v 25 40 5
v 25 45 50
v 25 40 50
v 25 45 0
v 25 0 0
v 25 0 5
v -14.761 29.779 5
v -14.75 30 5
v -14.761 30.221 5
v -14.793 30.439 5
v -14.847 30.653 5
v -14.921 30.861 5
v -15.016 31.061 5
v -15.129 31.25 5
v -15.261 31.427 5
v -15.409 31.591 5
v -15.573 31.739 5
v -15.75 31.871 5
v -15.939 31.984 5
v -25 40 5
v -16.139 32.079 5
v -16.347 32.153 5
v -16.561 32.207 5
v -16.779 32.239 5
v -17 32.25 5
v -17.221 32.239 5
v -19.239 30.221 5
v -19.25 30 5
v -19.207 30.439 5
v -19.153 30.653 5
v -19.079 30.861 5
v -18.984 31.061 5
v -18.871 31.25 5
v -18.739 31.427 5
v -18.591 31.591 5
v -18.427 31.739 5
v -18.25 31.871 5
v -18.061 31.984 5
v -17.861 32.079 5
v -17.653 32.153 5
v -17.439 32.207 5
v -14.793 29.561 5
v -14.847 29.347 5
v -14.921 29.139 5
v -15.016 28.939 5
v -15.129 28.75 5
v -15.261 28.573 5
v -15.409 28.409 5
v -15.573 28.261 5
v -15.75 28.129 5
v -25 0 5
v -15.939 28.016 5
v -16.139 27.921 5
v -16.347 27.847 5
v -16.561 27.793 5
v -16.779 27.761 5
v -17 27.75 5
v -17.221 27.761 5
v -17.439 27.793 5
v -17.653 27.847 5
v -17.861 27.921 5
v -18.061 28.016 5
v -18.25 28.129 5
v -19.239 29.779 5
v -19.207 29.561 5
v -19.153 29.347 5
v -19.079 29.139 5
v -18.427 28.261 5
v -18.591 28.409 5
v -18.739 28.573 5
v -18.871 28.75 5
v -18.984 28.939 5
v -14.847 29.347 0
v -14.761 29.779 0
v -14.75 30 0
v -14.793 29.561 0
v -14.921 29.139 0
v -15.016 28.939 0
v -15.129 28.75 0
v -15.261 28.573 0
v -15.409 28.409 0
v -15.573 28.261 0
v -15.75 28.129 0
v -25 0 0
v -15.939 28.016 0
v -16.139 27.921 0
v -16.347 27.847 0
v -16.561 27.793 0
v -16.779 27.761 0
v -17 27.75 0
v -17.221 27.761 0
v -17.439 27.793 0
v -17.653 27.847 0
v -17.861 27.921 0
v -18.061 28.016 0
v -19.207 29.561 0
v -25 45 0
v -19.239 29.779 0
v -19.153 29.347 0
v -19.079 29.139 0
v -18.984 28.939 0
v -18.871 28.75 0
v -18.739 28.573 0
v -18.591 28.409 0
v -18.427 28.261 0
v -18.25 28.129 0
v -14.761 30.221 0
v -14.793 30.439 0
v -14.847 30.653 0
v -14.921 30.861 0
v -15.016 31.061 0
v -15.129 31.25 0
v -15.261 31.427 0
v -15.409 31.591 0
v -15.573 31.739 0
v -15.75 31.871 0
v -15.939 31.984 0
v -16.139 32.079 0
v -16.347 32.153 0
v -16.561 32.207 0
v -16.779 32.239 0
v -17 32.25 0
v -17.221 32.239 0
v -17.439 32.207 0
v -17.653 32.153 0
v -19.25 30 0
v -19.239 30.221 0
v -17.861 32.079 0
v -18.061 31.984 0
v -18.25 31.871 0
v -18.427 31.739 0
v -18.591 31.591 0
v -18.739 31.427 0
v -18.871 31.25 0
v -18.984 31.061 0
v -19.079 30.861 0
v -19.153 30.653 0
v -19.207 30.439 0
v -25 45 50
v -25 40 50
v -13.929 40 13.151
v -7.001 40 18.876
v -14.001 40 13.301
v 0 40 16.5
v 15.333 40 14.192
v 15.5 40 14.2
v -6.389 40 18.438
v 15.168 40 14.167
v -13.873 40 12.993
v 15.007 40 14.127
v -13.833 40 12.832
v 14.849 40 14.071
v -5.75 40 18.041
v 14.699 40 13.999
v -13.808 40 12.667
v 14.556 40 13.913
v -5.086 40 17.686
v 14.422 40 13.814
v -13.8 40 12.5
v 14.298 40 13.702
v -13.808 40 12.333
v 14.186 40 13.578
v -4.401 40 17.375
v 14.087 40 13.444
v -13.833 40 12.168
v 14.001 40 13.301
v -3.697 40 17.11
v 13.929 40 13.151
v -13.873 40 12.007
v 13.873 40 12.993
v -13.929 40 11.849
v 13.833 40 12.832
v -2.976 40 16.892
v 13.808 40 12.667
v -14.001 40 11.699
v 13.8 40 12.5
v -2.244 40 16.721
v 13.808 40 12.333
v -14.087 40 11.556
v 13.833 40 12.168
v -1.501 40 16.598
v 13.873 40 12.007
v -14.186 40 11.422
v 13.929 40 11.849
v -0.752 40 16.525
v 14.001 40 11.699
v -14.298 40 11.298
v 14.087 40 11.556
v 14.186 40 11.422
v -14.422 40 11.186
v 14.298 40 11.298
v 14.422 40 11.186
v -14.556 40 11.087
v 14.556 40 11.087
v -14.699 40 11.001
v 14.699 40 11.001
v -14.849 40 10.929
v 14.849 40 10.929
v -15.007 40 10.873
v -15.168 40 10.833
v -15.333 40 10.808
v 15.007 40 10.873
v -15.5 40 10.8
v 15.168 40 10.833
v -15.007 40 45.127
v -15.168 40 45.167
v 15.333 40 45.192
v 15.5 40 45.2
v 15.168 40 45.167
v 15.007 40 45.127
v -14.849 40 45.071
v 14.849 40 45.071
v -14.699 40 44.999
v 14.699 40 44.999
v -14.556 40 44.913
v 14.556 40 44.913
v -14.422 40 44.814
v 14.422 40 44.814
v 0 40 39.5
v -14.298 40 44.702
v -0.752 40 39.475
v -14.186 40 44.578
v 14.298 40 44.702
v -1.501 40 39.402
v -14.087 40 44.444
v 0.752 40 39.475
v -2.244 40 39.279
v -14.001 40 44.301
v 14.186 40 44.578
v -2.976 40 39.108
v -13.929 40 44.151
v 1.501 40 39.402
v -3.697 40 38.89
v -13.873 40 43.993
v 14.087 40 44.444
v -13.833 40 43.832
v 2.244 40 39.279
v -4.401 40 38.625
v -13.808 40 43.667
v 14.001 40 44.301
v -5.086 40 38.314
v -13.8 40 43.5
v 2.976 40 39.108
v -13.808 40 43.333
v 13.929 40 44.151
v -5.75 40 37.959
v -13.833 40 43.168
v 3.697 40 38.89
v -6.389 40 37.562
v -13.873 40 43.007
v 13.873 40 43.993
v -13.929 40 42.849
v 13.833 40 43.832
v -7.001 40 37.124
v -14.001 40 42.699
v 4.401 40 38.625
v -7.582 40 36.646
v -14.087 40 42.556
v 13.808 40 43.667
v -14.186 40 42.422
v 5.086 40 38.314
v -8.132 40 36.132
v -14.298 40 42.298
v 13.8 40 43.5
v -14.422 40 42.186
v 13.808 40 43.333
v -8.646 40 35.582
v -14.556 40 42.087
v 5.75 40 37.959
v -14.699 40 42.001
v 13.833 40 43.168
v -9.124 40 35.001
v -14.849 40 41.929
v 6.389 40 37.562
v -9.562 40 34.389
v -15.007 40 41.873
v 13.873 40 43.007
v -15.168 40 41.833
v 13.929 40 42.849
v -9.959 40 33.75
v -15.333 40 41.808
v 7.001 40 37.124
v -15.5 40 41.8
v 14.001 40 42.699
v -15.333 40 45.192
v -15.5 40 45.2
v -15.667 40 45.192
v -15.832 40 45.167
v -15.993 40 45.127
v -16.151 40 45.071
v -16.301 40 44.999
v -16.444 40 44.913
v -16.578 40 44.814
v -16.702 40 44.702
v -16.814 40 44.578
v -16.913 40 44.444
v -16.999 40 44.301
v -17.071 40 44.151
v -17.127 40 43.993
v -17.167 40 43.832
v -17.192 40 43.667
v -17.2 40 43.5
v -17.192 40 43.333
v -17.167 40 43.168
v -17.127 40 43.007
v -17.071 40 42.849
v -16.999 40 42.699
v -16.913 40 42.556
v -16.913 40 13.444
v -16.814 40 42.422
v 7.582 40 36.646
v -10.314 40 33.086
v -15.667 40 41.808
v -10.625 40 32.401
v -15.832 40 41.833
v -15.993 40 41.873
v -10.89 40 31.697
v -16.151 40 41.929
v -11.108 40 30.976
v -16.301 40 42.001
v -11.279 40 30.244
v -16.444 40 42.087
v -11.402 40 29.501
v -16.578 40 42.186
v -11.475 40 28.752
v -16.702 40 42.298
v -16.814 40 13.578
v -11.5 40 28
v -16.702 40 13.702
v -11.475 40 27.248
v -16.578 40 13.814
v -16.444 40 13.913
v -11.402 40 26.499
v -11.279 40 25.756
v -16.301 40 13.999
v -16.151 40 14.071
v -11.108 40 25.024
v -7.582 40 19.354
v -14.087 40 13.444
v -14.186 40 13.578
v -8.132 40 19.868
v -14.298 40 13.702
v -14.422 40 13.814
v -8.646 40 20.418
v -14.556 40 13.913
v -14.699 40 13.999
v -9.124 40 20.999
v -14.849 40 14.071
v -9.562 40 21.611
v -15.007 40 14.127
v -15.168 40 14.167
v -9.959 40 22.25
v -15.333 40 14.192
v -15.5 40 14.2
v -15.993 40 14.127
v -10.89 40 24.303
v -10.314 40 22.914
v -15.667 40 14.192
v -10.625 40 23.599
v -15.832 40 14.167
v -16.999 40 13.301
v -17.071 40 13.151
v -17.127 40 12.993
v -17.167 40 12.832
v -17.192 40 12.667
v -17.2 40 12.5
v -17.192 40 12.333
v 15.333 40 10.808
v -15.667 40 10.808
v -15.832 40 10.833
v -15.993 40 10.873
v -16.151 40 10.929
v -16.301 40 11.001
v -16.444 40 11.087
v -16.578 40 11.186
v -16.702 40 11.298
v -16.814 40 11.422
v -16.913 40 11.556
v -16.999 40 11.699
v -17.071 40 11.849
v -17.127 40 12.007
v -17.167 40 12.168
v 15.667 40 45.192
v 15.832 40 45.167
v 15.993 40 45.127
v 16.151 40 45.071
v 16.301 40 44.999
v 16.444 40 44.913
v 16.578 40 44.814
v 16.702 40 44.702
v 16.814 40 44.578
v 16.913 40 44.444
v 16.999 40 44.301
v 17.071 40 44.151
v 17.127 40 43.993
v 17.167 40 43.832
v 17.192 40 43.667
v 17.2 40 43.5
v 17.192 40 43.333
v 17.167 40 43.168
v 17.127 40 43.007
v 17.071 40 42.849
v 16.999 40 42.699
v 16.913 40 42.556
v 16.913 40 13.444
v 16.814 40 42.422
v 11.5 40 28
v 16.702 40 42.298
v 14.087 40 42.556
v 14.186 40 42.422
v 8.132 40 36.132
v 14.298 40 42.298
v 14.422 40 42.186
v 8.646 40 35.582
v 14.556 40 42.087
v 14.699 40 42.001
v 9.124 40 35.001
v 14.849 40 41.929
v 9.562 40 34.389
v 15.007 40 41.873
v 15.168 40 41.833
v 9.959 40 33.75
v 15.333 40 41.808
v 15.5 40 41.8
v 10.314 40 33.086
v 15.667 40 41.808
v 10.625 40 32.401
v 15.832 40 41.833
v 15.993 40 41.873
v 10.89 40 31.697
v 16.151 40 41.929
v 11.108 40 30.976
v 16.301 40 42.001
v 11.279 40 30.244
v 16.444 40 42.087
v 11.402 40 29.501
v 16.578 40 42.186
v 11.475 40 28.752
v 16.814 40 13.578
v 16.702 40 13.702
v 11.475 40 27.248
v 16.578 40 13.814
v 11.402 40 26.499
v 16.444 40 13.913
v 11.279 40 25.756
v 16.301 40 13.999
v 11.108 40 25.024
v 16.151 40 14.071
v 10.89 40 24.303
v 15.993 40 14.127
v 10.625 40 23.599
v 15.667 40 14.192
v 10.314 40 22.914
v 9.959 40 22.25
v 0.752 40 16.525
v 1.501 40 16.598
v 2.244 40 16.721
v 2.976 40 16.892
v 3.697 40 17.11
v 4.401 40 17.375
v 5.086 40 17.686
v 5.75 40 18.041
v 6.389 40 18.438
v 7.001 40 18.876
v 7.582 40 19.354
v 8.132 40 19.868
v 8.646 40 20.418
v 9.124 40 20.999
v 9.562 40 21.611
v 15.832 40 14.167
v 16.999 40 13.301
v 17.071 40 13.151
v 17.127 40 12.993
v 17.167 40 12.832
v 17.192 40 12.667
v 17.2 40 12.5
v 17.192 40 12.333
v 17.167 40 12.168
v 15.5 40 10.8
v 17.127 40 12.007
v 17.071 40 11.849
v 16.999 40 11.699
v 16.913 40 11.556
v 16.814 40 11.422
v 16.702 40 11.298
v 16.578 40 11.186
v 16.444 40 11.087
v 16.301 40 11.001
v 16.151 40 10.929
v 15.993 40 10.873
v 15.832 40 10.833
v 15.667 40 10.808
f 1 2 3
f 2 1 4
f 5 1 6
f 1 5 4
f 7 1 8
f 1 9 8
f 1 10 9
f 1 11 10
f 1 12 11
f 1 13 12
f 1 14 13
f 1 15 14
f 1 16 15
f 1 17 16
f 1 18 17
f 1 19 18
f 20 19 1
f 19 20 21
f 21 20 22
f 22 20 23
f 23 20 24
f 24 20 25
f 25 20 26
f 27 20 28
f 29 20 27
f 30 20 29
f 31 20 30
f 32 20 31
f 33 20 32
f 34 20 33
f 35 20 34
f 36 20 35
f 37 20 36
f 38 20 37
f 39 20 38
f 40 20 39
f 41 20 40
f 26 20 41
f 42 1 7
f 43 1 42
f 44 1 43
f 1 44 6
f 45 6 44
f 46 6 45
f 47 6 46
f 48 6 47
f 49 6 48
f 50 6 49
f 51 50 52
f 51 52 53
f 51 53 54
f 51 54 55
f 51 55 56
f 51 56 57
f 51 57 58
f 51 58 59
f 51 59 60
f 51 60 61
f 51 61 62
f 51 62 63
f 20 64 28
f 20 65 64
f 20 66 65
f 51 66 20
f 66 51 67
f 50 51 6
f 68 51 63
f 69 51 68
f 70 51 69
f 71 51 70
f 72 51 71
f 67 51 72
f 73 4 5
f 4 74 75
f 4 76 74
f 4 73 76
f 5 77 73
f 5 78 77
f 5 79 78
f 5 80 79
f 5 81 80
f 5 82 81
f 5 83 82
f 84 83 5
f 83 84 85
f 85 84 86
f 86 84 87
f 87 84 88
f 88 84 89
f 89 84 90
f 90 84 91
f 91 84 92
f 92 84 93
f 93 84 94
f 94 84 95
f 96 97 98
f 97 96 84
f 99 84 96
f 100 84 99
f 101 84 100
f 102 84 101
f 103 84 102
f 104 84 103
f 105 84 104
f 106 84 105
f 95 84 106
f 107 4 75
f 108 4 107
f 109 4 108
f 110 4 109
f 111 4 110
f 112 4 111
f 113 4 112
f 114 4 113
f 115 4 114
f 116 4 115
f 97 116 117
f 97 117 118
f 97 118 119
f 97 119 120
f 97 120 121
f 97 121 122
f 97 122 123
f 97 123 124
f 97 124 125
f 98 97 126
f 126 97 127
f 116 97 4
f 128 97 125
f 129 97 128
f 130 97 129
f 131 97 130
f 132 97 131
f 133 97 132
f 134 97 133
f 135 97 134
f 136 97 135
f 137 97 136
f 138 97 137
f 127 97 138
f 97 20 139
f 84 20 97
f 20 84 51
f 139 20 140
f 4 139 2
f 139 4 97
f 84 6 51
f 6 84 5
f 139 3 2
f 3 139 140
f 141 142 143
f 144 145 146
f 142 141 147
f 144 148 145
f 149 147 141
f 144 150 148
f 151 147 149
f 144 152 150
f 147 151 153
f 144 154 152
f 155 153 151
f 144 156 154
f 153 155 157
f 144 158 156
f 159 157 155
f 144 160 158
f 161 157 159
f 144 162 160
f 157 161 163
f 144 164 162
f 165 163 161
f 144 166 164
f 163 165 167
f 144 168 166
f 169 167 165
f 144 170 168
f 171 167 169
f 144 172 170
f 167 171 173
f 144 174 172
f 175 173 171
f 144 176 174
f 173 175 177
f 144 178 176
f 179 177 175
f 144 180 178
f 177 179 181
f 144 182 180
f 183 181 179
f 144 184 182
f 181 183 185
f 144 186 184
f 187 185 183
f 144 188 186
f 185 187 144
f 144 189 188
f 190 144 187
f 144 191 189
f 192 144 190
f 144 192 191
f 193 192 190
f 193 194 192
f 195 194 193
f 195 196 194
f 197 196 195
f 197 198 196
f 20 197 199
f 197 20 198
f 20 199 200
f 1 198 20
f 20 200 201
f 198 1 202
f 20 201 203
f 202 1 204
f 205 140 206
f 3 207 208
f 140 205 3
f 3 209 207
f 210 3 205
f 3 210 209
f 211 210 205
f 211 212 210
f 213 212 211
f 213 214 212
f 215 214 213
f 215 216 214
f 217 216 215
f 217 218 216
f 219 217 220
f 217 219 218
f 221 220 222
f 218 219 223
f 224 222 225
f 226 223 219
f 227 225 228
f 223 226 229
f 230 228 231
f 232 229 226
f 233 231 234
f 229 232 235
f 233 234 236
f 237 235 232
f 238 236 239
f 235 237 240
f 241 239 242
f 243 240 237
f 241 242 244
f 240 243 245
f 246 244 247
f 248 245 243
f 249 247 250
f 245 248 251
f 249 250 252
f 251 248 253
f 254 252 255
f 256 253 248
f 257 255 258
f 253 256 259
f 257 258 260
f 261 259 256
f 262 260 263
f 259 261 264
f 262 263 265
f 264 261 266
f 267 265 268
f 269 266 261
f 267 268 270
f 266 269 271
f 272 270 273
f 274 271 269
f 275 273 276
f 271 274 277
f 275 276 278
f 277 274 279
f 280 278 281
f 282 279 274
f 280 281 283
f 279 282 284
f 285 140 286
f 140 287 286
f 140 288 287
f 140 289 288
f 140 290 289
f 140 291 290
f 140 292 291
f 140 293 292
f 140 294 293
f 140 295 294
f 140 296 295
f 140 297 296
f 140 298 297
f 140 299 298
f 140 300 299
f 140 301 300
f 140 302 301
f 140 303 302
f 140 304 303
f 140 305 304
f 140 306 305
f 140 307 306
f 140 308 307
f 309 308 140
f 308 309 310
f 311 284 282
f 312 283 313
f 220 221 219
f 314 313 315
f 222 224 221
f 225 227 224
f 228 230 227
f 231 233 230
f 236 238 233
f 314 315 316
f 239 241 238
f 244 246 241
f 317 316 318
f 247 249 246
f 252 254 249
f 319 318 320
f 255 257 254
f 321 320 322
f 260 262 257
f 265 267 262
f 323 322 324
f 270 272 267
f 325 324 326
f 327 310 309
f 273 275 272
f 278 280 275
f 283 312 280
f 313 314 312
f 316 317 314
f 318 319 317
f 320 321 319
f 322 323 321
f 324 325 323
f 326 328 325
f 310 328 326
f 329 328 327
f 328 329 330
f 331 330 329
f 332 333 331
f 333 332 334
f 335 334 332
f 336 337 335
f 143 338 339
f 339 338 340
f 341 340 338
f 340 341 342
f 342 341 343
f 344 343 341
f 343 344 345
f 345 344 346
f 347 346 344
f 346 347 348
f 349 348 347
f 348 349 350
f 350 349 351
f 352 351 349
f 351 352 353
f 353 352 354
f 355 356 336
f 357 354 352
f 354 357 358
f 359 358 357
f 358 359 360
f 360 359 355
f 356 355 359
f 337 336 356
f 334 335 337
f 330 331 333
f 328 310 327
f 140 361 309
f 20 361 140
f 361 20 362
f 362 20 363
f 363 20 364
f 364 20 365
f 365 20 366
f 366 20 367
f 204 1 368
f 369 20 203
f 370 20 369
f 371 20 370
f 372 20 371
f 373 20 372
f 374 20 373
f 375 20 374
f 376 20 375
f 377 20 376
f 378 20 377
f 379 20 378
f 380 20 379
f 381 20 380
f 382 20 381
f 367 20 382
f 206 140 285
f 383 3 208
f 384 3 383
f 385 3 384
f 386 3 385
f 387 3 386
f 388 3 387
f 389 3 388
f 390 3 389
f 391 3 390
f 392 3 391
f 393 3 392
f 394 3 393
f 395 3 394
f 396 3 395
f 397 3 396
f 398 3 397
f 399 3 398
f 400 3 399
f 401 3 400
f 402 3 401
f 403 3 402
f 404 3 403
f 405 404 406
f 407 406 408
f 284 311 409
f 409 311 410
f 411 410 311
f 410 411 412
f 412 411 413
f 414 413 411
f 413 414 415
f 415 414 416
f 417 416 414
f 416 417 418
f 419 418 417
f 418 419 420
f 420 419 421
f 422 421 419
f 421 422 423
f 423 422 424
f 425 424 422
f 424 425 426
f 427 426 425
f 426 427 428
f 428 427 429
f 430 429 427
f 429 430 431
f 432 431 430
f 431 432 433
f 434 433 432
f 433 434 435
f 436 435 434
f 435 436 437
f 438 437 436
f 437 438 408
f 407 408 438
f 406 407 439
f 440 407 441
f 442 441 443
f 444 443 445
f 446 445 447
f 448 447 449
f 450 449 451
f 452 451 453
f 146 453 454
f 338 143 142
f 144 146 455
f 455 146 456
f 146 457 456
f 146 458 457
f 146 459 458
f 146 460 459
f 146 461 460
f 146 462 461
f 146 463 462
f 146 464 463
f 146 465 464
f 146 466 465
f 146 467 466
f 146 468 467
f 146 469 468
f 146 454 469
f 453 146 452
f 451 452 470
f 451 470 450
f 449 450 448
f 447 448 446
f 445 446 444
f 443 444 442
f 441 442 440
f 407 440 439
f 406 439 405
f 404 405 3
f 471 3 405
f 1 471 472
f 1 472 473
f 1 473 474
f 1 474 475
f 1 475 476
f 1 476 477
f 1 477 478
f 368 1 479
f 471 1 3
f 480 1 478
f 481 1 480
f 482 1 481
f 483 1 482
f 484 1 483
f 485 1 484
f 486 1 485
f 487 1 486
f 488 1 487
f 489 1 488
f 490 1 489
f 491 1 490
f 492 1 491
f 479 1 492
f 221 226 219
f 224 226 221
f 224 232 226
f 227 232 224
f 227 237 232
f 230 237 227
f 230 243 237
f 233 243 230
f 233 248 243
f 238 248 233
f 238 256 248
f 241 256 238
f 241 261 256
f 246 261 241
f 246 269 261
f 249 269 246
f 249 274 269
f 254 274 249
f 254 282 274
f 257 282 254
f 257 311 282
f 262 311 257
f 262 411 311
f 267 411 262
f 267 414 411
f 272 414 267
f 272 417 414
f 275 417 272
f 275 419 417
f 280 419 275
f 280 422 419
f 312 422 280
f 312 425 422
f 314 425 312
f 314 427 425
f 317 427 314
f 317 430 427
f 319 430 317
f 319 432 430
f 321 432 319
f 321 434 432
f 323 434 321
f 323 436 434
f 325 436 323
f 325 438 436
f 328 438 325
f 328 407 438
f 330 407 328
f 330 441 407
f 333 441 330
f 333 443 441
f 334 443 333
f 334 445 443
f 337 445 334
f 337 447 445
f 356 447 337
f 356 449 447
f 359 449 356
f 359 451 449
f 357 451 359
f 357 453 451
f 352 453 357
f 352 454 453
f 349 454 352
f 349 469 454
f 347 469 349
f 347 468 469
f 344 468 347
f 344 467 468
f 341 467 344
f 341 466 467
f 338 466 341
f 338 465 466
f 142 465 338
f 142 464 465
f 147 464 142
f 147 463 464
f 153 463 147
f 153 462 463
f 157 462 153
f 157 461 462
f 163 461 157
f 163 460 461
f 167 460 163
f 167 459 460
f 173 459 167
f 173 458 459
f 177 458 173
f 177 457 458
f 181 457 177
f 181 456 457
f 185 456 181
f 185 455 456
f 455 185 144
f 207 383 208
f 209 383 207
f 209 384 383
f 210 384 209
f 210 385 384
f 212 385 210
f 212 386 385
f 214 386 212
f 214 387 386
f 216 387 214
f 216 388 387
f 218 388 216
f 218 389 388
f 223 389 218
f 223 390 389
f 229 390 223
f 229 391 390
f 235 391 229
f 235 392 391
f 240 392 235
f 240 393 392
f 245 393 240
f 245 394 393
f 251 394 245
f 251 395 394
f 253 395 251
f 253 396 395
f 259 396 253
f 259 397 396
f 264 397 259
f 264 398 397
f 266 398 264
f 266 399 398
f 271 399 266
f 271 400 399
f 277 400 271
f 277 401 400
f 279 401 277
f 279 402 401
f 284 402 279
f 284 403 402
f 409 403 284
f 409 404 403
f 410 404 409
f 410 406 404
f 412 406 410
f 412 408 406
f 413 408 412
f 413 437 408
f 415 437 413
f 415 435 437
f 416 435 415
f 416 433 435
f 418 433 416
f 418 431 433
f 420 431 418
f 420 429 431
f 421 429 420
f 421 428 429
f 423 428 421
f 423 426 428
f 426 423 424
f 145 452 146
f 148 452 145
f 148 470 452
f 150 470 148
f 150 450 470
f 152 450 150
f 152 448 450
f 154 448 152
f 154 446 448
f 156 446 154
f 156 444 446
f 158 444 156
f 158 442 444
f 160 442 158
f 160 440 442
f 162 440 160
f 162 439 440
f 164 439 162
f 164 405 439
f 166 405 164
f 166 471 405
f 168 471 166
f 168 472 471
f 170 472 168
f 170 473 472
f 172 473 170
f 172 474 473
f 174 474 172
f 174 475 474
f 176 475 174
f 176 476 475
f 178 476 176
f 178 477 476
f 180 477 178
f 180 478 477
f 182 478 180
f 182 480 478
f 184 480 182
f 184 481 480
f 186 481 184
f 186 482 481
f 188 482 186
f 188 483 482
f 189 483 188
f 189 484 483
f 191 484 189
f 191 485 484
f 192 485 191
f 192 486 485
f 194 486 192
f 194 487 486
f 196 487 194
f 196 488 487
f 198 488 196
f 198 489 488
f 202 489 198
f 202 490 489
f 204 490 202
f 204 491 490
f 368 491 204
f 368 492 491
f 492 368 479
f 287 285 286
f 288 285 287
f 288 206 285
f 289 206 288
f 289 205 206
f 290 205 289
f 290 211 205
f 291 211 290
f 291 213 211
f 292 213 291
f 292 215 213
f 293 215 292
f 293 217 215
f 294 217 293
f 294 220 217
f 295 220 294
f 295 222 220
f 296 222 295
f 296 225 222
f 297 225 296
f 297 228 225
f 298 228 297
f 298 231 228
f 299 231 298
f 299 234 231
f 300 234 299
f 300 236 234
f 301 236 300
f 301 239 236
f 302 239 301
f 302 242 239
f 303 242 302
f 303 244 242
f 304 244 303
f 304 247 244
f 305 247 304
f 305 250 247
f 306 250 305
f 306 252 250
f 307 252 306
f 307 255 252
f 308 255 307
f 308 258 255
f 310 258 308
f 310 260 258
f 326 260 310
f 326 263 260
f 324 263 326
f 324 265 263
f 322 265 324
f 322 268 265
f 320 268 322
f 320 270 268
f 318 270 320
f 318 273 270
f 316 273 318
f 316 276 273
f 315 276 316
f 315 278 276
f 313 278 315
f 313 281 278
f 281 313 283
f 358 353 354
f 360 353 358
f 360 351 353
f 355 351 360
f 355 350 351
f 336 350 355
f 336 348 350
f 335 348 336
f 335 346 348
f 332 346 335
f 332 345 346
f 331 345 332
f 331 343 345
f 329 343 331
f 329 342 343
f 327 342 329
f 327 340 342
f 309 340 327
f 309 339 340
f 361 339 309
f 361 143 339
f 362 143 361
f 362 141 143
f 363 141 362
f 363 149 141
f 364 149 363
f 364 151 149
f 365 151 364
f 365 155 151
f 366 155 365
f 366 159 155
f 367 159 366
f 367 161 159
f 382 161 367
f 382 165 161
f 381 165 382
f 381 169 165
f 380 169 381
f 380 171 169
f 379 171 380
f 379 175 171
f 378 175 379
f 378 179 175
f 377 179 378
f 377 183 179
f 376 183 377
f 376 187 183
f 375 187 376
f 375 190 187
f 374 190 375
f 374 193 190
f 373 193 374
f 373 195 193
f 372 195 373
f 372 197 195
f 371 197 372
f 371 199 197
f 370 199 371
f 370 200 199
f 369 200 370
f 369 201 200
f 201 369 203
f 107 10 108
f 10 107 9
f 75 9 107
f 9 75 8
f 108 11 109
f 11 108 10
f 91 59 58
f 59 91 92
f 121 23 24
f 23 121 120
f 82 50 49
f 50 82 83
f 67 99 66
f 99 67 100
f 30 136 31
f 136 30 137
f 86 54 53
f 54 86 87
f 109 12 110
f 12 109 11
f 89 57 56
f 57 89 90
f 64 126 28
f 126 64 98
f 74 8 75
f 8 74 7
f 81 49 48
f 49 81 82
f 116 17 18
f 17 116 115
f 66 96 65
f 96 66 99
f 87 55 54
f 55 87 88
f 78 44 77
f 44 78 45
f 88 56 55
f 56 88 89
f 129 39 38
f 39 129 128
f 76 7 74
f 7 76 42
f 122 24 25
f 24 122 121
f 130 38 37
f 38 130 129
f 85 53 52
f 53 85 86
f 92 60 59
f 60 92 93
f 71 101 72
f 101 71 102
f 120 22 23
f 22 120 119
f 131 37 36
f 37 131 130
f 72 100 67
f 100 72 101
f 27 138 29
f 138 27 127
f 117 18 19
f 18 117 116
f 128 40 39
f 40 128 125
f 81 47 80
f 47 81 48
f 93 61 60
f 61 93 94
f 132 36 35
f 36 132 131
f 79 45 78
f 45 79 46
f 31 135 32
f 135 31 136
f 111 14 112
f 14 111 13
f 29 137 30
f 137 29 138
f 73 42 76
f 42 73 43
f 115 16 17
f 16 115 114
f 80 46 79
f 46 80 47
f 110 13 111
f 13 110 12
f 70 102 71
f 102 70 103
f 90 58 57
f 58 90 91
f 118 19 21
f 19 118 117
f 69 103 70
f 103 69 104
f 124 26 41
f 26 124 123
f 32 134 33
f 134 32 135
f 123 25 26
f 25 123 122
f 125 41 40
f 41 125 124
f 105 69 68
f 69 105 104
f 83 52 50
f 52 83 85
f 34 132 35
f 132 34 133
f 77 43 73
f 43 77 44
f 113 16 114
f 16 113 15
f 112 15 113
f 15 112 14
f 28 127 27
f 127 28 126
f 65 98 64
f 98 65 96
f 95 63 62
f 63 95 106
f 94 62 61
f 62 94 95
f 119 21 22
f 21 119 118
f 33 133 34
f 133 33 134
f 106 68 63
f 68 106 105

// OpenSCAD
// L-shaped mounting bracket for NEMA 17 stepper motor
// Print orientation: base plate on bed (z = 0), motor plate builds upward (+Z)

// ---------------- Parameters ----------------
plate_x       = 25;    // base plate half-width (X)
plate_y       = 45;    // base plate length (Y)
plate_t       = 5;     // base plate thickness (Z)

motor_h       = 50;    // motor plate height (Z)
motor_w       = 5;     // motor plate thickness (Y)

boss_d        = 23;    // motor boss hole diameter
boss_x        = 0;     // boss hole centre X
boss_z        = 28;    // boss hole centre Z

screw_d       = 3.4;   // M3 screw hole diameter
screw_pattern = 31;    // square pitch of screw holes
screw_count   = 4;     // number of screw holes

gusset_t      = 5;     // gusset thickness (X)
gusset_leg    = 20;    // right-triangle leg length (Y and Z)
gusset_x      = [-25, -20, 20, 25]; // gusset X positions (flush edges)

eps           = 0.5;   // cutter overshoot past faces
$fn           = 96;    // curve resolution

// ---------------- Model ----------------
difference() {
    union() {
        // Base plate
        translate([-plate_x, 0, 0])
            cube([plate_x * 2, plate_y, plate_t]);

        // Vertical motor plate
        translate([-plate_x, plate_y - motor_w, 0])
            cube([plate_x * 2, motor_w, motor_h]);
    }

    // Base plate through-holes (M4)
    for (h = [plate_t + eps, motor_h - eps])
        translate([-17, 30, 0])
            cylinder(d = 4.5, h = h, $fn = 64);

    // Motor boss hole (along Y) and screw holes (square pattern)
    translate([boss_x, plate_y - motor_w, boss_z])
        rotate([90, 0, 0]) {
            cylinder(d = boss_d, h = motor_w + 2 * eps, $fn = 96);
            for (i = [0 : screw_count - 1])
                for (j = [0 : screw_count - 1])
                    translate([(i - (screw_count - 1) / 2) * screw_pattern,
                               (j - (screw_count - 1) / 2) * screw_pattern,
                               0])
                        cylinder(d = screw_d, h = motor_w + 2 * eps, $fn = 64);
        }

    // Triangular gussets, flush with left and right edges
    for (gx = gusset_x)
        translate([gx, plate_y - gusset_leg, gusset_leg])
            rotate([90, 0, 0])
                linear_extrude(height = gusset_t)
                    polygon(points = [
                        [0, 0],
                        [gusset_leg, 0],
                        [0, gusset_leg]
                    ]);
}
